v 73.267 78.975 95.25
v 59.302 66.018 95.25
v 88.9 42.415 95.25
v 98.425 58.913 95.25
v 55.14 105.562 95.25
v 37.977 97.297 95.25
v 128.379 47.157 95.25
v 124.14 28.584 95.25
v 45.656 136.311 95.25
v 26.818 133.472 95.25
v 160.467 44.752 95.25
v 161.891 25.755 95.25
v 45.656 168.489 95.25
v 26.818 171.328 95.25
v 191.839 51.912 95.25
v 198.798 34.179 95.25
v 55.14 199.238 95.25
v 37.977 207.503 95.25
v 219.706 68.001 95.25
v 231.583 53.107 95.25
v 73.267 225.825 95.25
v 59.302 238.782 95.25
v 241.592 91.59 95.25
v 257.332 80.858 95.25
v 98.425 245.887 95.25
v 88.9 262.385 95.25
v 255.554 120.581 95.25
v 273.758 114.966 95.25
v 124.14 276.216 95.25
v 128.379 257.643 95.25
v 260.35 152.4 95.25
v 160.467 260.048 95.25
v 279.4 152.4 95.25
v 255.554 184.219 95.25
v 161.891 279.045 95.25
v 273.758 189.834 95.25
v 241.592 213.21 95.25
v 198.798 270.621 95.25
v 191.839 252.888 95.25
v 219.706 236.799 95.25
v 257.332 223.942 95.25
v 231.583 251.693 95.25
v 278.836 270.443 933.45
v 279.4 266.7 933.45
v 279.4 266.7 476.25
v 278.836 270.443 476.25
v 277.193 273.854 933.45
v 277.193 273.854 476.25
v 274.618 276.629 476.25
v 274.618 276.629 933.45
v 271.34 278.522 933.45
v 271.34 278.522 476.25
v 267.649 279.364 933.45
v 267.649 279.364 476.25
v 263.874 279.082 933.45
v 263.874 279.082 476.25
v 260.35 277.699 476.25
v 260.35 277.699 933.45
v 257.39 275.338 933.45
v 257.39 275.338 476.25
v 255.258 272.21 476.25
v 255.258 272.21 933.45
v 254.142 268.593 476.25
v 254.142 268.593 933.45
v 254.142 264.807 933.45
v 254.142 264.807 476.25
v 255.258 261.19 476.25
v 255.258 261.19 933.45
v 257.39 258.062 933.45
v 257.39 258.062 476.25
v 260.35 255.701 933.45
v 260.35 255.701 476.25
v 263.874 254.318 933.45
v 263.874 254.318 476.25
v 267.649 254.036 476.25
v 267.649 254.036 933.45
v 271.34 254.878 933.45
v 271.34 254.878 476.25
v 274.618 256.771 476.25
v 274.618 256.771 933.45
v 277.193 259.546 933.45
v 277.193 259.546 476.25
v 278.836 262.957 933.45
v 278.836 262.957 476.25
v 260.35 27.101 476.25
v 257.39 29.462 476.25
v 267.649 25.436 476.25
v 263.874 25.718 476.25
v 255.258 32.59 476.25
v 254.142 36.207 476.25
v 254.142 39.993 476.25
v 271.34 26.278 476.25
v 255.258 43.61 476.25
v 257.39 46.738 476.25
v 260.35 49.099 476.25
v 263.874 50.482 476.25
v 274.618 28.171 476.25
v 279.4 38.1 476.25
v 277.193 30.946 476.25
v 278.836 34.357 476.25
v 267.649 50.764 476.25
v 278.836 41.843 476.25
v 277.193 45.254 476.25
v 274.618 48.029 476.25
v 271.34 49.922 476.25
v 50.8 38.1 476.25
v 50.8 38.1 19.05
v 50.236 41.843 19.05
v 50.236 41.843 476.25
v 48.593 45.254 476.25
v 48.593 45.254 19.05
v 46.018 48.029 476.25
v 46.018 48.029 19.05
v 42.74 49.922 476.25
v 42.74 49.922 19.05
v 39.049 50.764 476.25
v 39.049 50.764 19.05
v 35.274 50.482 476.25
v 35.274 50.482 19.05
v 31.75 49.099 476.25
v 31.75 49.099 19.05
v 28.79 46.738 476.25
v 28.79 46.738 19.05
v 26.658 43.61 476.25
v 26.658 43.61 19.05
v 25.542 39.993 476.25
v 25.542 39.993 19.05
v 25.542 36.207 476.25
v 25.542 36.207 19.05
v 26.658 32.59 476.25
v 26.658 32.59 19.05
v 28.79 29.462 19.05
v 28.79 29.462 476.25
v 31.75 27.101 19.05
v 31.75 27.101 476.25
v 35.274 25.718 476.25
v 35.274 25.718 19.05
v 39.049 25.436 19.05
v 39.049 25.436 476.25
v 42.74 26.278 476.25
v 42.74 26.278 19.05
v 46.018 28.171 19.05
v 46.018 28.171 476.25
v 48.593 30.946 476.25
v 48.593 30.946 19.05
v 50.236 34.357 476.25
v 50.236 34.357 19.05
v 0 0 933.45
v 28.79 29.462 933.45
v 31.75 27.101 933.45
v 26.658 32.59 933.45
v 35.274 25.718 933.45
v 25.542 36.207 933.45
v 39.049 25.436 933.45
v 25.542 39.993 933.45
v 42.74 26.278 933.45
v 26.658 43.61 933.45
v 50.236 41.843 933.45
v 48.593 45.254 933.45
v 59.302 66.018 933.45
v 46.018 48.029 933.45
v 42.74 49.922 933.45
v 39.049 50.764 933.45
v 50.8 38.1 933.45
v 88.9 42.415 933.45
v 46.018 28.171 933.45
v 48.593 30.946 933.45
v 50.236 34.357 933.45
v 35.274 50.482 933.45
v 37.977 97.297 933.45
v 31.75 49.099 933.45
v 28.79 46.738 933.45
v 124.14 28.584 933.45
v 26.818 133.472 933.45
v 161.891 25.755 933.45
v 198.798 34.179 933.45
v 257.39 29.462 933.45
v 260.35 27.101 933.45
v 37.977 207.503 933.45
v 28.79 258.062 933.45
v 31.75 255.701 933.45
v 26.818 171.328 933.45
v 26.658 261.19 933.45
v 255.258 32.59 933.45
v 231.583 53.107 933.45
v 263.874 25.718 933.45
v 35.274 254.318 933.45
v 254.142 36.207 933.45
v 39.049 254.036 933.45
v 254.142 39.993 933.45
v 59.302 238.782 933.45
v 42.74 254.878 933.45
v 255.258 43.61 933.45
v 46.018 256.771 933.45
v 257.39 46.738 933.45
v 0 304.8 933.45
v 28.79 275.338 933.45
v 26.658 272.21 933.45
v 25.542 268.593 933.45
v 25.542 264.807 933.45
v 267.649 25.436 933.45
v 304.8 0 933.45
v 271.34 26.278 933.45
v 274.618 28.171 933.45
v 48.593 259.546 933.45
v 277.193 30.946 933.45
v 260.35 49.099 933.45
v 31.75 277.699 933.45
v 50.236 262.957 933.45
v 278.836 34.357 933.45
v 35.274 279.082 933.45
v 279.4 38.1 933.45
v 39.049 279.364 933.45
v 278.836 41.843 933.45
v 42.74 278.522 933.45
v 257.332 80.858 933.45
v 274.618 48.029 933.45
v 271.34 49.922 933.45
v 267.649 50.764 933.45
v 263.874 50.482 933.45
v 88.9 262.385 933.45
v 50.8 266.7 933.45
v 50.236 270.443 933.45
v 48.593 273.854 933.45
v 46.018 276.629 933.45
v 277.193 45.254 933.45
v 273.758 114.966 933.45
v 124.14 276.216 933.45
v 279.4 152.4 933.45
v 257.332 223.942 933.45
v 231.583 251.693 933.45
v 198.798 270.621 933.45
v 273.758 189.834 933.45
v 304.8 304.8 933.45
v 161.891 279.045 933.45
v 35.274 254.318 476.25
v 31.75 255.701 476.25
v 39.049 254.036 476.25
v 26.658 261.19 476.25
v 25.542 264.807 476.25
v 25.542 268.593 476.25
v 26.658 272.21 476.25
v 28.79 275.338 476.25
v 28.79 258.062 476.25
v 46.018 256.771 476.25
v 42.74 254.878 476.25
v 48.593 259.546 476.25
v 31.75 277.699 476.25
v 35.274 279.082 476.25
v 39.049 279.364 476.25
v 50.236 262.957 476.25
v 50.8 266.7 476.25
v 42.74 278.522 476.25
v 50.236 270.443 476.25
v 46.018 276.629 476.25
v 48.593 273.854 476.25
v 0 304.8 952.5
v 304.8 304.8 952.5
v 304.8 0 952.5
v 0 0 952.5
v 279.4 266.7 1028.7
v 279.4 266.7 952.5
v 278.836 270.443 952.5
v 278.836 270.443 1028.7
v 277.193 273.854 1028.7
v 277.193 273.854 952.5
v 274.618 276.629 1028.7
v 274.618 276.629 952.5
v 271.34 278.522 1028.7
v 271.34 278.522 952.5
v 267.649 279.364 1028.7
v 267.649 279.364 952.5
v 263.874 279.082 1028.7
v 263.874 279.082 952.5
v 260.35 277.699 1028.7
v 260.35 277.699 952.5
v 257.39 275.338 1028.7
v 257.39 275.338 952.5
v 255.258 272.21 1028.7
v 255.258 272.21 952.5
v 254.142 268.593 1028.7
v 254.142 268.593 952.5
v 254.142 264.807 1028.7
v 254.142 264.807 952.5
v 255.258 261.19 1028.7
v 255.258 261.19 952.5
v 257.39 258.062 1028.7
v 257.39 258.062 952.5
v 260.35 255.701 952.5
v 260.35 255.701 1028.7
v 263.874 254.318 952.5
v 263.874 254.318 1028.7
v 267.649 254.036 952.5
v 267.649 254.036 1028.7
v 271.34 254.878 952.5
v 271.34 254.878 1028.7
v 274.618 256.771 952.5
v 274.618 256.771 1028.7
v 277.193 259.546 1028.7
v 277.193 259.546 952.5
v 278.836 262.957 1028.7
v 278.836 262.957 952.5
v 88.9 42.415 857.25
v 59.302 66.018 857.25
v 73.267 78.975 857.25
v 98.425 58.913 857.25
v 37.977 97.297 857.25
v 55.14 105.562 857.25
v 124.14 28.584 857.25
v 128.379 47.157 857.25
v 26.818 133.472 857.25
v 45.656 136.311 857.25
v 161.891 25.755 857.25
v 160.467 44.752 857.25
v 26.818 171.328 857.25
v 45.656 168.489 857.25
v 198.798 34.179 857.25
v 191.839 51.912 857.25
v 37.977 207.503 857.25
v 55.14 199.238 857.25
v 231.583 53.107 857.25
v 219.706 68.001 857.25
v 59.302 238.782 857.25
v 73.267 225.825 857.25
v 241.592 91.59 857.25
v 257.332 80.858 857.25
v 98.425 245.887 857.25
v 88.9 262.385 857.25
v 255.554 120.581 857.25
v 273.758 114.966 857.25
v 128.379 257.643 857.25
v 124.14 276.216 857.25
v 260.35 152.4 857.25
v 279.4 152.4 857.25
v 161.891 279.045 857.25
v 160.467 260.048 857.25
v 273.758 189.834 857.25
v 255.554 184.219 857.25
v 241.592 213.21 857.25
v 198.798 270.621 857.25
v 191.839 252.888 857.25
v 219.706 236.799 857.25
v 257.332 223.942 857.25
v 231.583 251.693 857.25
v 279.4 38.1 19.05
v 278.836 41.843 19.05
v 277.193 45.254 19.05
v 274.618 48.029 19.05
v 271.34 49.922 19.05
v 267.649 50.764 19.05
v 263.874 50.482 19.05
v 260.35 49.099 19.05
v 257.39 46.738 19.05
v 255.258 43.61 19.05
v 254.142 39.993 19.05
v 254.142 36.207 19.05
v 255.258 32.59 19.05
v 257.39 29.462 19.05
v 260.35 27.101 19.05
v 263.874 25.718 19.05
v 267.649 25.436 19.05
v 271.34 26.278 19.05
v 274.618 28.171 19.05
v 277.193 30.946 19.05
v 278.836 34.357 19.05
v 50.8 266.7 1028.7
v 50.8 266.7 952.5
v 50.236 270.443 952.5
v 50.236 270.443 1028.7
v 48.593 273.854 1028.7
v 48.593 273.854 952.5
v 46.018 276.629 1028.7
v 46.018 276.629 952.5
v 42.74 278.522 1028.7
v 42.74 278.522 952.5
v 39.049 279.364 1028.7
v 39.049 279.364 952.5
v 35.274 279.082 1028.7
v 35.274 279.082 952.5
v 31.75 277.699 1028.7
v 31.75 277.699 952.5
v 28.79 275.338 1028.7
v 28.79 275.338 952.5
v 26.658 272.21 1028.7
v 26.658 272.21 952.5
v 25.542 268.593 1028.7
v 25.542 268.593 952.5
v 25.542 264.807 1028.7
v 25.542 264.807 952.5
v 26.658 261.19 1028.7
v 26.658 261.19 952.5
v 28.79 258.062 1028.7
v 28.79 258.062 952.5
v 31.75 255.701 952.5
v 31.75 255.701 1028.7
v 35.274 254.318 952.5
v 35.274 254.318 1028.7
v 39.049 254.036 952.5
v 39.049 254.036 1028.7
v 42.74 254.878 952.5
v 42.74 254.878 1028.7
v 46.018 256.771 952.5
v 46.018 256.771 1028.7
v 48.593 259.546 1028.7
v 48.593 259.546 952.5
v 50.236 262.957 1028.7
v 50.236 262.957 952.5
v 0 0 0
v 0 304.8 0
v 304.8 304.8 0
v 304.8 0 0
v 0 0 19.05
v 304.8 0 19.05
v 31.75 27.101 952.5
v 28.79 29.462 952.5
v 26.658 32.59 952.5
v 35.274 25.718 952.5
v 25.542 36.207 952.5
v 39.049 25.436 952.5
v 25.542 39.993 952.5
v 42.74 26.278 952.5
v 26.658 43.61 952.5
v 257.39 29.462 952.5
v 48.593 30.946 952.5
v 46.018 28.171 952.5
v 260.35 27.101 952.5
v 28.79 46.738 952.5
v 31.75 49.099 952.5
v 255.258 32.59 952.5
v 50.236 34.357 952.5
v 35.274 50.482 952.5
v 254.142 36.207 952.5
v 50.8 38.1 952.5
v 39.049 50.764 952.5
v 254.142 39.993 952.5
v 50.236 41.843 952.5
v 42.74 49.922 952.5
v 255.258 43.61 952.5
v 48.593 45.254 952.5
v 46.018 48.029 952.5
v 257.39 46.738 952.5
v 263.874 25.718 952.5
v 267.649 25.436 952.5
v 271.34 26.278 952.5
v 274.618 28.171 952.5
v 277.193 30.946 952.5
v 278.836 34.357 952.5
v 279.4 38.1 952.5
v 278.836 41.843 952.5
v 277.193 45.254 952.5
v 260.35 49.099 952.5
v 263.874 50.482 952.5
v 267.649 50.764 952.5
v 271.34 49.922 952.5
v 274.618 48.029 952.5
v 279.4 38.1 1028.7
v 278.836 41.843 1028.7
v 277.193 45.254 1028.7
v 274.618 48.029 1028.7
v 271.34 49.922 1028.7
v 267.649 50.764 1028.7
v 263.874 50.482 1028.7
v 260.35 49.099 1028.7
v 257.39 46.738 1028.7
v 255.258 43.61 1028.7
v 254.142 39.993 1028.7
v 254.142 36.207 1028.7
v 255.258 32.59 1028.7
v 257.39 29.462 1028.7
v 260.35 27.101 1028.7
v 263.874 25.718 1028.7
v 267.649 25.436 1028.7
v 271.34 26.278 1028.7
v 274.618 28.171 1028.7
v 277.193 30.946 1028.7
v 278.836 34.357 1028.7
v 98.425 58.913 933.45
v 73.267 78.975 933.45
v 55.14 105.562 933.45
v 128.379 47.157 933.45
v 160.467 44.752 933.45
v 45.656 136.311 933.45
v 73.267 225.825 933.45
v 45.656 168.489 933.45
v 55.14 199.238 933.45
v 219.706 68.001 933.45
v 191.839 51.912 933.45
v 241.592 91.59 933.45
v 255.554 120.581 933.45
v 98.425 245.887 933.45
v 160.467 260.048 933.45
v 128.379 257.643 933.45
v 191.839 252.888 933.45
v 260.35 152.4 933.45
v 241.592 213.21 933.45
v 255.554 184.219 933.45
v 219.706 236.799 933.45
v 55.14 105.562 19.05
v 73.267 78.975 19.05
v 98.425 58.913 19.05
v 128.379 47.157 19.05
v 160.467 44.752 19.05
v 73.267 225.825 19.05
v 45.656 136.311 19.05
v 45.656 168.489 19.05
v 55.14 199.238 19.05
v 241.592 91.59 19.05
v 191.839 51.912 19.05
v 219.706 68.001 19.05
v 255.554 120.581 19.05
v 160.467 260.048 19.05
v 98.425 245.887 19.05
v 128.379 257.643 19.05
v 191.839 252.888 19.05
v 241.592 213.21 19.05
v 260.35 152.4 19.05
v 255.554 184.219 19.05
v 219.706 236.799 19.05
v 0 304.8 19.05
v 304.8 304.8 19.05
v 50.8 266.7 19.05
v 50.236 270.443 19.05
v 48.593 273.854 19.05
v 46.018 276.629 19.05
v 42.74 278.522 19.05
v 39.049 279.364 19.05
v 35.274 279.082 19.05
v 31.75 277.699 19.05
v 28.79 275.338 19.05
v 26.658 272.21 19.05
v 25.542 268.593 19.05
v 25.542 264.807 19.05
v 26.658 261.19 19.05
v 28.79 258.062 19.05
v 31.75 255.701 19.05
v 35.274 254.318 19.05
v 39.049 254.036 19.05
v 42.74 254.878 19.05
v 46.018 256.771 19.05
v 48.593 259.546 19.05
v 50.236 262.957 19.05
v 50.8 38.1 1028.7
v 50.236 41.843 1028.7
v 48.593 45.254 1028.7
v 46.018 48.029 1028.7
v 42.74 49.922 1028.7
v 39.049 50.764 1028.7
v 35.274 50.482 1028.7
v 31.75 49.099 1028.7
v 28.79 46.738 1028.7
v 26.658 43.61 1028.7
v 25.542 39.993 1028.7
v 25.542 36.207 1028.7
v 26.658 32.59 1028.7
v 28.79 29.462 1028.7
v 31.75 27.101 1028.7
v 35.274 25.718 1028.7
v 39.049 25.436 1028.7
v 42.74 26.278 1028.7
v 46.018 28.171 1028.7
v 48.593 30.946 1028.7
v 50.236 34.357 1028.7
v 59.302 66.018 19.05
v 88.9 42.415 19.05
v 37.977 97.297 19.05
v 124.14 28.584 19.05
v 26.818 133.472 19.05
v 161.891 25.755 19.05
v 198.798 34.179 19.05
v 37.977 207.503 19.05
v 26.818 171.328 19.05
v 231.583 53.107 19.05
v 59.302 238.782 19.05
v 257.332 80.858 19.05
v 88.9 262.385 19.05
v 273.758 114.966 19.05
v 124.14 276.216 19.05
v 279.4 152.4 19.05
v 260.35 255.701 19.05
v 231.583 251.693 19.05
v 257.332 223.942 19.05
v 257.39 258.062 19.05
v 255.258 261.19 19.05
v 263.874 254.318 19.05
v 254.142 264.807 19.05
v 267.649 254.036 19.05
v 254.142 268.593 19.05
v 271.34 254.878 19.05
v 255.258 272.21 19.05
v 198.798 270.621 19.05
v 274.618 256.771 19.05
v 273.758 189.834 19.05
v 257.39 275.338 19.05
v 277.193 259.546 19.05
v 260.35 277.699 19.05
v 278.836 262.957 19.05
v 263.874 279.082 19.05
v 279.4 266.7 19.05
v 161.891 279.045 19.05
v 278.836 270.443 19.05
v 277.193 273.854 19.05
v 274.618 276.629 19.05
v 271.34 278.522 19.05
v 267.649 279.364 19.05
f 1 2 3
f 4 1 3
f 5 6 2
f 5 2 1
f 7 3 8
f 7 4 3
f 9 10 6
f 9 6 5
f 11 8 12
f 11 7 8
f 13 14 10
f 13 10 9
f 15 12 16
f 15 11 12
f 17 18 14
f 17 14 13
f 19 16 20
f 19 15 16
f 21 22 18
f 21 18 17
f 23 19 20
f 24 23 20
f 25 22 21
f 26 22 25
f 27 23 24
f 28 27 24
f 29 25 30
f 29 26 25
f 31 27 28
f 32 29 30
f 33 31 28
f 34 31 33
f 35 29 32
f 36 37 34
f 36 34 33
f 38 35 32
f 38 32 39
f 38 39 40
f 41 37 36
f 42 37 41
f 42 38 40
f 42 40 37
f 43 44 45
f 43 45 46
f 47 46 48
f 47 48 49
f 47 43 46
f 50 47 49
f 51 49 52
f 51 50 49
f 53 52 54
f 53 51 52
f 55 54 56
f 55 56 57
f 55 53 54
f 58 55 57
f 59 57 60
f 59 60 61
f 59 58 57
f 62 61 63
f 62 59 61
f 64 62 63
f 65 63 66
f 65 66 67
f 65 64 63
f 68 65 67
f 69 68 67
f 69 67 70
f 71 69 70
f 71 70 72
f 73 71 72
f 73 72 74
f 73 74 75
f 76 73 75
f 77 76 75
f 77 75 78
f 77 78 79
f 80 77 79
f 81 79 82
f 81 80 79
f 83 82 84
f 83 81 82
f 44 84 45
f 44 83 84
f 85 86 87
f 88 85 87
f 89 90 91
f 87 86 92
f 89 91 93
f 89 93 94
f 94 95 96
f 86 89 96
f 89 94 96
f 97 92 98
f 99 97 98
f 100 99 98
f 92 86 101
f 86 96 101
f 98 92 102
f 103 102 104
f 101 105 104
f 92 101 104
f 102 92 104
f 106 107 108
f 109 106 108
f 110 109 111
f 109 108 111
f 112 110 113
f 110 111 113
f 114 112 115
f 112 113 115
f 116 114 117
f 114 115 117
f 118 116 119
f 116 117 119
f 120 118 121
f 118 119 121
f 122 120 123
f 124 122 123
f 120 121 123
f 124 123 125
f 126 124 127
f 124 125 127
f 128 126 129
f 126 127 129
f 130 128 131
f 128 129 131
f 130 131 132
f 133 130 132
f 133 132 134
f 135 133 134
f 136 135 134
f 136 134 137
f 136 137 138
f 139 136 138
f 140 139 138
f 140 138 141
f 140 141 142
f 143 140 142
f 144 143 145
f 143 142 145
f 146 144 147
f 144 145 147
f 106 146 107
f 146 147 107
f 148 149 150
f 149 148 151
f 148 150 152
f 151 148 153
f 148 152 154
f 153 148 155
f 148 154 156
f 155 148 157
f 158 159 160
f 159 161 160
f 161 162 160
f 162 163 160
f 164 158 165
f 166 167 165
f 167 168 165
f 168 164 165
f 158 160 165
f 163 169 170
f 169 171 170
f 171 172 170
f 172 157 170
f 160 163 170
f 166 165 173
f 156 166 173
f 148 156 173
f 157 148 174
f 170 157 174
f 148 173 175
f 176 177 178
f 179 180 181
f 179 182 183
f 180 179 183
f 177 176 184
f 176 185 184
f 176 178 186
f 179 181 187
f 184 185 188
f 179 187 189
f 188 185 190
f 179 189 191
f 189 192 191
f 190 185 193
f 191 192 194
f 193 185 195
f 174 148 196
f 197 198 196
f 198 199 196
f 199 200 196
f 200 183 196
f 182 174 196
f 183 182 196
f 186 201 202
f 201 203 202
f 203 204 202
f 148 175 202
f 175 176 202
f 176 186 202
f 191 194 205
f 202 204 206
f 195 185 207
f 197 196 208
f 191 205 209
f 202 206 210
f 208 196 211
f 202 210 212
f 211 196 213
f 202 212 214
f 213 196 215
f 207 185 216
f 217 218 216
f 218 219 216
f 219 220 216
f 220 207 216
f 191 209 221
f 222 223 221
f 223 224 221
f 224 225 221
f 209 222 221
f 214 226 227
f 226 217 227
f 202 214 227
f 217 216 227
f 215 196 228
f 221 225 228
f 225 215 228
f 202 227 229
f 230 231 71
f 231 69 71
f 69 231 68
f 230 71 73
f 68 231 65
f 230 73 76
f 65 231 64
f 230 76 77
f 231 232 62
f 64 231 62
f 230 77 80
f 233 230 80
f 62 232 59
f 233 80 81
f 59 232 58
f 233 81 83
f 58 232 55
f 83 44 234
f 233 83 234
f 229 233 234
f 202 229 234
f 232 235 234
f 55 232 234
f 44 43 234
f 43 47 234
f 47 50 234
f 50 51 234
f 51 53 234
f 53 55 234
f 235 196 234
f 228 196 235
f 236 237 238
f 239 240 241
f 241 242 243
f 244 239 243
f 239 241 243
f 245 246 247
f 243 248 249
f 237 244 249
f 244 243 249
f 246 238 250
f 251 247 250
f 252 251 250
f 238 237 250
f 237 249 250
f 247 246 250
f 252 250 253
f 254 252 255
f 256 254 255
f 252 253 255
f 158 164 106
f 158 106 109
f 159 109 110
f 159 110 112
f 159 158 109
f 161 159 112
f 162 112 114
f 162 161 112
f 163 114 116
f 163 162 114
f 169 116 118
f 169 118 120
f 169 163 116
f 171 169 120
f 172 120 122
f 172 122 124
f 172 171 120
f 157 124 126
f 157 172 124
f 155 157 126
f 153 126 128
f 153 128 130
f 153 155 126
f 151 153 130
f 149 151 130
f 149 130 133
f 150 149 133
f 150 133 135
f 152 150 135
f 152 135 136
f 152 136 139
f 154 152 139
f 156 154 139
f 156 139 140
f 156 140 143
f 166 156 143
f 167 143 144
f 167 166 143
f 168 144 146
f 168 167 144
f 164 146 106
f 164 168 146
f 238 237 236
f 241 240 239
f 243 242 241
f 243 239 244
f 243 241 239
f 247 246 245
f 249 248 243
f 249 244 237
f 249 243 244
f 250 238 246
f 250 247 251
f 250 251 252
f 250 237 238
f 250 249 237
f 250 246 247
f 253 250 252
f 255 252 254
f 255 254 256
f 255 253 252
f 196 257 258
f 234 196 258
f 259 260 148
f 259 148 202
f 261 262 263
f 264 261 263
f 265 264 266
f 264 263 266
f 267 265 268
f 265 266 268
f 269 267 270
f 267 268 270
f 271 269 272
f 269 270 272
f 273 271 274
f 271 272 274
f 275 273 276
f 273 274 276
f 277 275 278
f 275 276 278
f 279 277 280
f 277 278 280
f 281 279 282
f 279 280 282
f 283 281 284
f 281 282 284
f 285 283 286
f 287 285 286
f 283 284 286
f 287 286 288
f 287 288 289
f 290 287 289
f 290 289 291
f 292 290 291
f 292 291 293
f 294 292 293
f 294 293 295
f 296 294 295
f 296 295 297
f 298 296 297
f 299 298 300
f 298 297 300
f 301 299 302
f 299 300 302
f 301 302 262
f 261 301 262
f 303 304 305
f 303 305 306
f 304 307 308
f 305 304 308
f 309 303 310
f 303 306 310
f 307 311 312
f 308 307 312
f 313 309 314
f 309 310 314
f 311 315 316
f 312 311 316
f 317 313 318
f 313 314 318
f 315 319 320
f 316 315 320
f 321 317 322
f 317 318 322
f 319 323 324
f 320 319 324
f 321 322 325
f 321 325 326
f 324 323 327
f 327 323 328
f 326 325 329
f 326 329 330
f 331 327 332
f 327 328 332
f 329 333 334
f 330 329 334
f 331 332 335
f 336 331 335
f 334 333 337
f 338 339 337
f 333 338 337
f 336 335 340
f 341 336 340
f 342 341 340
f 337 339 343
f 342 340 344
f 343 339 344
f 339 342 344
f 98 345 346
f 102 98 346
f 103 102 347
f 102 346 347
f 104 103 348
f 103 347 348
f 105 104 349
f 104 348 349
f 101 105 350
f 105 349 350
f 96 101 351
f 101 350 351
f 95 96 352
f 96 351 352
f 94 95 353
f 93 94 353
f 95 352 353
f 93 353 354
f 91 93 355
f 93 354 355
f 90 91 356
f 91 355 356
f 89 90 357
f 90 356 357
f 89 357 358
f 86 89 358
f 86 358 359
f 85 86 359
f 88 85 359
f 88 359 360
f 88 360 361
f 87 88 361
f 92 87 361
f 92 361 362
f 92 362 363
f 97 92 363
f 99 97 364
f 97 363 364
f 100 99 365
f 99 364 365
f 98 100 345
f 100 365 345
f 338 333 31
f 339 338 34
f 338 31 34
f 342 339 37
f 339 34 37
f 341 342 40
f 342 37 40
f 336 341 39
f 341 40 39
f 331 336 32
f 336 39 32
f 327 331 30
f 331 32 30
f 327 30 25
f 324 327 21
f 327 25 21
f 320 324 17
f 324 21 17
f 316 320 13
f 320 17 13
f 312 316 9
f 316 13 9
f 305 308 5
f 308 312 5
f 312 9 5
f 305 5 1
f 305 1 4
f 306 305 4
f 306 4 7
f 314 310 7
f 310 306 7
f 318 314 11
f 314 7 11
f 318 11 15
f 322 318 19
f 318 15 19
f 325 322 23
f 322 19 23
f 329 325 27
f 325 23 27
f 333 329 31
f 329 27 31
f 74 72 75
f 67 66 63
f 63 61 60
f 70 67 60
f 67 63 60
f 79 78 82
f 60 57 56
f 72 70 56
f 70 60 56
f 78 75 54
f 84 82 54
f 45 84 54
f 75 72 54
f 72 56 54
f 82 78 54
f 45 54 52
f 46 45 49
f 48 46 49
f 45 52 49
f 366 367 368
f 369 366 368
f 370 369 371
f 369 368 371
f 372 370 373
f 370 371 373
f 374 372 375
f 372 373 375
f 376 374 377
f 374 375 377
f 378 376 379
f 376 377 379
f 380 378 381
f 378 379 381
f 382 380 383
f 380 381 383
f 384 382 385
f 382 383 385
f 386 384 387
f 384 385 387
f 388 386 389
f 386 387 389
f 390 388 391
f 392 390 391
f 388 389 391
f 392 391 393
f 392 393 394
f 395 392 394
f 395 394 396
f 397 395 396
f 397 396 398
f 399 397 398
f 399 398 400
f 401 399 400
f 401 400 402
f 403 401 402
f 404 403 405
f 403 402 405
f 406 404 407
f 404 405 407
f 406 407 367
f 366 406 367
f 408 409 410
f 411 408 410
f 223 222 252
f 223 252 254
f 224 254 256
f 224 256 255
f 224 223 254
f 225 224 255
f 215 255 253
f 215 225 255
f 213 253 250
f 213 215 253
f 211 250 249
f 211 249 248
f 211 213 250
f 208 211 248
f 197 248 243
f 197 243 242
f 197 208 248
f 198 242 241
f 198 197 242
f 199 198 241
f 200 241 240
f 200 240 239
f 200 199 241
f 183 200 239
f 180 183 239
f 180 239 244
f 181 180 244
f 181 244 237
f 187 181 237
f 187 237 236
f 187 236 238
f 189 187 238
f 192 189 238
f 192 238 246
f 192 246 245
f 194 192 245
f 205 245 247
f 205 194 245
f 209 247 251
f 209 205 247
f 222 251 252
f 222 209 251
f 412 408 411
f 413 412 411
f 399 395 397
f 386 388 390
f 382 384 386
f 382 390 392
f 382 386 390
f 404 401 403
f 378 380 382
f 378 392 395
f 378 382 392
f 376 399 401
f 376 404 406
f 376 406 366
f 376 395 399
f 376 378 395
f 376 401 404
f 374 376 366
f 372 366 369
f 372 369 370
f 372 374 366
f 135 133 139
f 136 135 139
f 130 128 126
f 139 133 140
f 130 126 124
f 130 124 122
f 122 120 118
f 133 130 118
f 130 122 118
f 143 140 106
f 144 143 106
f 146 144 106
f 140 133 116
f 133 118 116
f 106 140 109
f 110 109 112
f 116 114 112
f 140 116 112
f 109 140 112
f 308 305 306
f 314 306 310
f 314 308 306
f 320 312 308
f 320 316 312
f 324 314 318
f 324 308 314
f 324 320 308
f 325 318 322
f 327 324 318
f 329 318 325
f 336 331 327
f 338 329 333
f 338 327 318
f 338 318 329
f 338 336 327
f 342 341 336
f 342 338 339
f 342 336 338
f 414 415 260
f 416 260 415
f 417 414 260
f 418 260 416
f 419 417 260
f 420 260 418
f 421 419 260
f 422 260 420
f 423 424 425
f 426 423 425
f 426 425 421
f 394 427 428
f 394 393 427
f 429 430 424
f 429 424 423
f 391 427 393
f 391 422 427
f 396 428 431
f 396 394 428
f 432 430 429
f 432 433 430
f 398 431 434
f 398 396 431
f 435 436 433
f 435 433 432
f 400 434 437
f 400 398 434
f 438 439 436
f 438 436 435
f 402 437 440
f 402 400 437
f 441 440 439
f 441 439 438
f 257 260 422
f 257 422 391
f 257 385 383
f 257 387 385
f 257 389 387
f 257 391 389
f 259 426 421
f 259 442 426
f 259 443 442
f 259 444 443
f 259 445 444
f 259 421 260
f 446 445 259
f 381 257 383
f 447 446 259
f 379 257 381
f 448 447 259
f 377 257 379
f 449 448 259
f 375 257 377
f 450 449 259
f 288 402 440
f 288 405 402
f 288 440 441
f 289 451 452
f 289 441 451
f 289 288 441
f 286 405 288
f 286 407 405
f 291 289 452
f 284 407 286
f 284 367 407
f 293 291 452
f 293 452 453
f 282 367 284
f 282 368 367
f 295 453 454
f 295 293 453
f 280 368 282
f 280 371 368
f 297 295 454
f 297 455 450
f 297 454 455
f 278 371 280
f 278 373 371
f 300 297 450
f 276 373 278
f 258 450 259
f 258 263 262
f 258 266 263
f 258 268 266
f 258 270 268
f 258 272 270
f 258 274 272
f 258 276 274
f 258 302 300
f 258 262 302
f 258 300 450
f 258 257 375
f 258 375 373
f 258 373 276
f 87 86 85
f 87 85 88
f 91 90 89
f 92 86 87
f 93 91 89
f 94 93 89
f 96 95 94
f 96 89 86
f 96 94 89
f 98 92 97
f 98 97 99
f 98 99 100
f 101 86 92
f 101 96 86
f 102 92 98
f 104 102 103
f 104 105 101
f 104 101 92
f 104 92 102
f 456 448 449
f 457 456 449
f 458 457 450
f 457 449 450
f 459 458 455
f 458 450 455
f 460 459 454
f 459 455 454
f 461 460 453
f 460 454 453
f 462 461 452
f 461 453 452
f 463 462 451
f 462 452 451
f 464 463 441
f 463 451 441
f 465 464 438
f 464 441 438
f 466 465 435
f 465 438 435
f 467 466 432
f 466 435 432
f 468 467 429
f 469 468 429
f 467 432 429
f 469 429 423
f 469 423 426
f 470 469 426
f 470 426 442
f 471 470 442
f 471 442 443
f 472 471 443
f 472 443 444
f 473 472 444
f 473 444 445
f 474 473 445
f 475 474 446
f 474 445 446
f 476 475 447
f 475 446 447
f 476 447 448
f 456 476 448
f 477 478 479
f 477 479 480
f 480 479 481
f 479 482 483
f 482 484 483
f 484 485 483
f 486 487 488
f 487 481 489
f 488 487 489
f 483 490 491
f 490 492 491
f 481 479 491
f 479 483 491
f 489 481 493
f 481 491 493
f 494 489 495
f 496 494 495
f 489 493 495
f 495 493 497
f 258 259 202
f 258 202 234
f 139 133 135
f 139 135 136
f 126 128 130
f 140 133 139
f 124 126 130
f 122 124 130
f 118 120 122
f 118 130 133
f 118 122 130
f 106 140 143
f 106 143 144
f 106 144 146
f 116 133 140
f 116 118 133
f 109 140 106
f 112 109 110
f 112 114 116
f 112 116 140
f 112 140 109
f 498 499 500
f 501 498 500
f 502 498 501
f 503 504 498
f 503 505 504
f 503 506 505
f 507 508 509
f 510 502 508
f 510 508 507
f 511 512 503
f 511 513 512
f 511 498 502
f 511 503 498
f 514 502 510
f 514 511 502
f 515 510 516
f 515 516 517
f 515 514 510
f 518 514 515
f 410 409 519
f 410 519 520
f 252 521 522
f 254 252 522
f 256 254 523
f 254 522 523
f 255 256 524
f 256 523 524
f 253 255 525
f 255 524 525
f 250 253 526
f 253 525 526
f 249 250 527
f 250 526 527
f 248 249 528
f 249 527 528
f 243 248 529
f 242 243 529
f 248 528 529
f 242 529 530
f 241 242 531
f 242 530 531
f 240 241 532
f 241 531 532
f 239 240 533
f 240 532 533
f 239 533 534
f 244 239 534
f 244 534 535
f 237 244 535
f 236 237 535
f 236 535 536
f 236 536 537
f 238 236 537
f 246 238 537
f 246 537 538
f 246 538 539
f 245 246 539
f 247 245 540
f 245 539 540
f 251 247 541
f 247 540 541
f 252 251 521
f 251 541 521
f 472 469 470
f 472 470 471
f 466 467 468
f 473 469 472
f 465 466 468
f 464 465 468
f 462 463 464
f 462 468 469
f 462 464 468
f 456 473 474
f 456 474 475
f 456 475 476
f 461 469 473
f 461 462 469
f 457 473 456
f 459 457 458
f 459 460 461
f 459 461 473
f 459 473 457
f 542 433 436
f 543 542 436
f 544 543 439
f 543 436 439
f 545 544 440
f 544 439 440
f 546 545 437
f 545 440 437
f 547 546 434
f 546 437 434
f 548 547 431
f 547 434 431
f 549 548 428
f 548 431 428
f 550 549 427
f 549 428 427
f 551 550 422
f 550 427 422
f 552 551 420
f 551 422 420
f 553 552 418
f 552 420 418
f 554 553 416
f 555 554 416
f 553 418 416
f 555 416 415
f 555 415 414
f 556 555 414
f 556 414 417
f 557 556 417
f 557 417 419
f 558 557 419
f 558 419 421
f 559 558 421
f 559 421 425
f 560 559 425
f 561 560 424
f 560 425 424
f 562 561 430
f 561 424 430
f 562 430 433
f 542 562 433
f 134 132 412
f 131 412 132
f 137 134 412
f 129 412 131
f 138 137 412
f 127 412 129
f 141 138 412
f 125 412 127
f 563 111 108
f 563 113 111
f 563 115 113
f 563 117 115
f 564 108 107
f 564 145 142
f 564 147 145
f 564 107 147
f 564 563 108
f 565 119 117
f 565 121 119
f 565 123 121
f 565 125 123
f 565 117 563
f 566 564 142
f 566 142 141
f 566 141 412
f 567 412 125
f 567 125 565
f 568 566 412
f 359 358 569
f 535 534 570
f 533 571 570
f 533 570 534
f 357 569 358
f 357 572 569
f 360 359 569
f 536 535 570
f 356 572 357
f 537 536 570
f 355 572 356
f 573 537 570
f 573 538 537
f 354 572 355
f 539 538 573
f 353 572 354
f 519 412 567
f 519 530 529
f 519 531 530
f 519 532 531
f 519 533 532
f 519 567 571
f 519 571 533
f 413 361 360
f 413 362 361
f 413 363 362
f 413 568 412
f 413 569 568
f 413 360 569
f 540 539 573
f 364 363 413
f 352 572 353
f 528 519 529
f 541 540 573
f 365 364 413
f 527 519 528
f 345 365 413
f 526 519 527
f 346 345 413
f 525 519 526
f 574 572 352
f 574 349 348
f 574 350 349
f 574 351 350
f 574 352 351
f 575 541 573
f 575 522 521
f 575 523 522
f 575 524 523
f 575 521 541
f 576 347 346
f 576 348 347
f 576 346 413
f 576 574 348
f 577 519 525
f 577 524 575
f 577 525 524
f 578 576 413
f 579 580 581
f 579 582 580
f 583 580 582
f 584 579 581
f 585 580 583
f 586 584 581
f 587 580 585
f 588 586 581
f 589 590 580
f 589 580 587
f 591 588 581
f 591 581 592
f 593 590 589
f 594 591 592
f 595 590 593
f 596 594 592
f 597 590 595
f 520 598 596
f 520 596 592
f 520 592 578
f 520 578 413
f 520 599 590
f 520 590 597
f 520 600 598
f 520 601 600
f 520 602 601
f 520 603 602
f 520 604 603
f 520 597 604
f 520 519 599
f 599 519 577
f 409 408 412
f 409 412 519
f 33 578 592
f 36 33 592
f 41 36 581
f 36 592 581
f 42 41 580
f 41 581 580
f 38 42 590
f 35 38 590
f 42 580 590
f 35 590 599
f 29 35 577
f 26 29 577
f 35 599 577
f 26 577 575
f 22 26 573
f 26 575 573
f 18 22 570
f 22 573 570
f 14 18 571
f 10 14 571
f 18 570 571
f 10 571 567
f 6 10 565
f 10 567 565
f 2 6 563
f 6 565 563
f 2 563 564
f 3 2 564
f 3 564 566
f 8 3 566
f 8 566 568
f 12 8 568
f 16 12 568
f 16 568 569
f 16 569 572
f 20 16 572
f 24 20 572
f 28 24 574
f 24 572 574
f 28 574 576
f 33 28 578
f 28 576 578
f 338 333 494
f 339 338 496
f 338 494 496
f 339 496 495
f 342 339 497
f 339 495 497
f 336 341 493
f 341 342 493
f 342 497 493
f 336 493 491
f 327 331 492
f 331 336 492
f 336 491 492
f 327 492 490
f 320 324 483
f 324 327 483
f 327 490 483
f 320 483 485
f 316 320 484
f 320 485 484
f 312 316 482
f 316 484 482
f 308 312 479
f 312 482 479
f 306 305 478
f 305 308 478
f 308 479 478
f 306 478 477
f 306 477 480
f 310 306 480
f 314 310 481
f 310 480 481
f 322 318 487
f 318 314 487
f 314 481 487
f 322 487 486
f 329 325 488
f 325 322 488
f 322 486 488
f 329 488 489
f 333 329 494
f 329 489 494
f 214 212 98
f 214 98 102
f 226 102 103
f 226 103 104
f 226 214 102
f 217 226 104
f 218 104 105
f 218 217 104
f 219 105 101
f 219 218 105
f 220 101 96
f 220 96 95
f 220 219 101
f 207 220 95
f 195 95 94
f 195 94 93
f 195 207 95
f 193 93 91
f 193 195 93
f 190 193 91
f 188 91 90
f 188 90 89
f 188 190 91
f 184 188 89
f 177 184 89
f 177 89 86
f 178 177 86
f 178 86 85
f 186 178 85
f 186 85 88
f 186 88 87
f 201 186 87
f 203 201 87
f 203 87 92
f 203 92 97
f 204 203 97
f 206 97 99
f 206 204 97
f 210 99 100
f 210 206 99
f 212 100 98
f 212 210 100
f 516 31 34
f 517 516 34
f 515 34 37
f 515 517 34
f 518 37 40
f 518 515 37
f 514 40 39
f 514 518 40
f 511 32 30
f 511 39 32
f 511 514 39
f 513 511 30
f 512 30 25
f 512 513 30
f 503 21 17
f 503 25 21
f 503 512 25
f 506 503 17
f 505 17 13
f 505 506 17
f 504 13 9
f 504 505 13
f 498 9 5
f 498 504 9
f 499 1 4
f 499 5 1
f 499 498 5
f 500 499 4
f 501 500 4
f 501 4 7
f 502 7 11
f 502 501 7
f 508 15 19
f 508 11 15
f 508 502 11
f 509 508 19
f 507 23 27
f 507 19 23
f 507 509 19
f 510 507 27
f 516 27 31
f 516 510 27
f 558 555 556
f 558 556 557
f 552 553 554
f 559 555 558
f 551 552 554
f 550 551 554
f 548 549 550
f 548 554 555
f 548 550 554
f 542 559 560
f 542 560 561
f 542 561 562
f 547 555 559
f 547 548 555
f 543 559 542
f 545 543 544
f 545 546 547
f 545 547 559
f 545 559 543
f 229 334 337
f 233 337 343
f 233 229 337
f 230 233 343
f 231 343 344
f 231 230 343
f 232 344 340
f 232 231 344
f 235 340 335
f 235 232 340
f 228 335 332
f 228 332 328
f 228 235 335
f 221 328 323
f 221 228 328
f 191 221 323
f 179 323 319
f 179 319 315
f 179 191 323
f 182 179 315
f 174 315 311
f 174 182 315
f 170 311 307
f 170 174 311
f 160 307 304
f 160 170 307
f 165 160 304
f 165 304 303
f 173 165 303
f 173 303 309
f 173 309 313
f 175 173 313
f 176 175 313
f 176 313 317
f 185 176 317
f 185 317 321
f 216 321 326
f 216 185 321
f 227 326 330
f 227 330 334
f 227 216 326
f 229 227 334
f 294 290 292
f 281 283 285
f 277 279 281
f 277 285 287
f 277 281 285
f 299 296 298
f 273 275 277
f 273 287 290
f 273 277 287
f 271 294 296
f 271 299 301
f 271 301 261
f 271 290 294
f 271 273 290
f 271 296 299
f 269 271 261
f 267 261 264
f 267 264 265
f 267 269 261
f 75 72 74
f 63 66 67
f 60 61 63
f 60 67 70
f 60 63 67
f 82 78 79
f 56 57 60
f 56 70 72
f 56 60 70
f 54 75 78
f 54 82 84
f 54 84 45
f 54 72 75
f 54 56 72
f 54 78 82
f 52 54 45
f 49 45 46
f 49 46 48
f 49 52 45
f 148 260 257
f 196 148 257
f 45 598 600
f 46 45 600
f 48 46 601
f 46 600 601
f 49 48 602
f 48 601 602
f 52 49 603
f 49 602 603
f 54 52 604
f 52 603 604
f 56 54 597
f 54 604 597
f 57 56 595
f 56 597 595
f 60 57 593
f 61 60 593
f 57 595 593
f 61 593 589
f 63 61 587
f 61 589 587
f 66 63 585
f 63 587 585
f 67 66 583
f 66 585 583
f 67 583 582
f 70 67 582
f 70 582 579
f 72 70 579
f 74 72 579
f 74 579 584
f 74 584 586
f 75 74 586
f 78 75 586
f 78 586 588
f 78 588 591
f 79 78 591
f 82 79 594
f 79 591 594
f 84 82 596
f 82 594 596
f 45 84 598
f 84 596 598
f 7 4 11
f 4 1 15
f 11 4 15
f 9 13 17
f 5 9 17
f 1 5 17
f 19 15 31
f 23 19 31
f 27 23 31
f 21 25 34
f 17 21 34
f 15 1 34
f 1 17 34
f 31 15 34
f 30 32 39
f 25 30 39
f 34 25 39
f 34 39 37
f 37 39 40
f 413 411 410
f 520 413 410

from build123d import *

# Parameters (mm, degrees)
F0_W      = 304.8
F0_H      = 304.8
F1_DEPTH  = 19.05
F2_R      = 127
F3_DEPTH  = 76.2
F4_T      = -19.05
F5_R      = 12.7
F6_DEPTH  = 457.2
F7_R      = 107.95
F8_DEPTH  = 381
F10_R     = 107.95
F11_DEPTH = 381
F12_R     = 12.7
F13_DEPTH = 76.2


with BuildPart() as f1:
    # F0 (on Top) → F1 (new body)
    with BuildSketch(Plane.XY):
        with Locations((152.4, 152.4)):
            Rectangle(F0_W, F0_H)
    extrude(amount=F1_DEPTH)

    # F2 (on face) → F3 (join)
    with BuildSketch(Plane.XY.offset(19.05)):
        with Locations((152.4, 152.4)):
            Circle(F2_R)
    extrude(amount=F3_DEPTH)

    # F4
    f4_openings = [f1.faces().sort_by_distance(p)[0] for p in [
        (152.4, 152.4, 95.25),
    ]]
    offset(amount=F4_T, openings=f4_openings, kind=Kind.INTERSECTION)

    # F5 (on face) → F6 (join)
    with BuildSketch(Plane.XY.offset(19.05)):
        with Locations((266.7, 266.7)):
            Circle(F5_R)
        with Locations((266.7, 38.1)):
            Circle(F5_R)
        with Locations((38.1, 266.7)):
            Circle(F5_R)
        with Locations((38.1, 38.1)):
            Circle(F5_R)
    extrude(amount=F6_DEPTH)


with BuildPart() as f8:
    # F7 (on face) → F8 (new body)
    with BuildSketch(Plane.XY.offset(95.25)):
        with Locations((152.4, 152.4)):
            Circle(F7_R)
    extrude(amount=F8_DEPTH)



with BuildPart() as f9_1:
    # F9: instance of F1
    add(f1.part.mirror(Plane(origin=(152.4, 152.4, 476.25), x_dir=(1, 0, 0), z_dir=(0, 0, 1))))


with BuildPart() as f8_1:
    add(f8.part)

    add(f9_1.part)  # F11 merges F9_1
    # F10 (on face) → F11 (join)
    with BuildSketch(Plane.XY.offset(476.25)):
        with Locations((152.4, 152.4)):
            Circle(F10_R)
    extrude(amount=F11_DEPTH)

    # F12 (on face) → F13 (join)
    with BuildSketch(Plane.XY.offset(952.5)):
        with Locations((38.1, 266.7)):
            Circle(F12_R)
        with Locations((38.1, 38.1)):
            Circle(F12_R)
        with Locations((266.7, 266.7)):
            Circle(F12_R)
        with Locations((266.7, 38.1)):
            Circle(F12_R)
    extrude(amount=F13_DEPTH)


solid = Compound([f1.part, f8_1.part])
